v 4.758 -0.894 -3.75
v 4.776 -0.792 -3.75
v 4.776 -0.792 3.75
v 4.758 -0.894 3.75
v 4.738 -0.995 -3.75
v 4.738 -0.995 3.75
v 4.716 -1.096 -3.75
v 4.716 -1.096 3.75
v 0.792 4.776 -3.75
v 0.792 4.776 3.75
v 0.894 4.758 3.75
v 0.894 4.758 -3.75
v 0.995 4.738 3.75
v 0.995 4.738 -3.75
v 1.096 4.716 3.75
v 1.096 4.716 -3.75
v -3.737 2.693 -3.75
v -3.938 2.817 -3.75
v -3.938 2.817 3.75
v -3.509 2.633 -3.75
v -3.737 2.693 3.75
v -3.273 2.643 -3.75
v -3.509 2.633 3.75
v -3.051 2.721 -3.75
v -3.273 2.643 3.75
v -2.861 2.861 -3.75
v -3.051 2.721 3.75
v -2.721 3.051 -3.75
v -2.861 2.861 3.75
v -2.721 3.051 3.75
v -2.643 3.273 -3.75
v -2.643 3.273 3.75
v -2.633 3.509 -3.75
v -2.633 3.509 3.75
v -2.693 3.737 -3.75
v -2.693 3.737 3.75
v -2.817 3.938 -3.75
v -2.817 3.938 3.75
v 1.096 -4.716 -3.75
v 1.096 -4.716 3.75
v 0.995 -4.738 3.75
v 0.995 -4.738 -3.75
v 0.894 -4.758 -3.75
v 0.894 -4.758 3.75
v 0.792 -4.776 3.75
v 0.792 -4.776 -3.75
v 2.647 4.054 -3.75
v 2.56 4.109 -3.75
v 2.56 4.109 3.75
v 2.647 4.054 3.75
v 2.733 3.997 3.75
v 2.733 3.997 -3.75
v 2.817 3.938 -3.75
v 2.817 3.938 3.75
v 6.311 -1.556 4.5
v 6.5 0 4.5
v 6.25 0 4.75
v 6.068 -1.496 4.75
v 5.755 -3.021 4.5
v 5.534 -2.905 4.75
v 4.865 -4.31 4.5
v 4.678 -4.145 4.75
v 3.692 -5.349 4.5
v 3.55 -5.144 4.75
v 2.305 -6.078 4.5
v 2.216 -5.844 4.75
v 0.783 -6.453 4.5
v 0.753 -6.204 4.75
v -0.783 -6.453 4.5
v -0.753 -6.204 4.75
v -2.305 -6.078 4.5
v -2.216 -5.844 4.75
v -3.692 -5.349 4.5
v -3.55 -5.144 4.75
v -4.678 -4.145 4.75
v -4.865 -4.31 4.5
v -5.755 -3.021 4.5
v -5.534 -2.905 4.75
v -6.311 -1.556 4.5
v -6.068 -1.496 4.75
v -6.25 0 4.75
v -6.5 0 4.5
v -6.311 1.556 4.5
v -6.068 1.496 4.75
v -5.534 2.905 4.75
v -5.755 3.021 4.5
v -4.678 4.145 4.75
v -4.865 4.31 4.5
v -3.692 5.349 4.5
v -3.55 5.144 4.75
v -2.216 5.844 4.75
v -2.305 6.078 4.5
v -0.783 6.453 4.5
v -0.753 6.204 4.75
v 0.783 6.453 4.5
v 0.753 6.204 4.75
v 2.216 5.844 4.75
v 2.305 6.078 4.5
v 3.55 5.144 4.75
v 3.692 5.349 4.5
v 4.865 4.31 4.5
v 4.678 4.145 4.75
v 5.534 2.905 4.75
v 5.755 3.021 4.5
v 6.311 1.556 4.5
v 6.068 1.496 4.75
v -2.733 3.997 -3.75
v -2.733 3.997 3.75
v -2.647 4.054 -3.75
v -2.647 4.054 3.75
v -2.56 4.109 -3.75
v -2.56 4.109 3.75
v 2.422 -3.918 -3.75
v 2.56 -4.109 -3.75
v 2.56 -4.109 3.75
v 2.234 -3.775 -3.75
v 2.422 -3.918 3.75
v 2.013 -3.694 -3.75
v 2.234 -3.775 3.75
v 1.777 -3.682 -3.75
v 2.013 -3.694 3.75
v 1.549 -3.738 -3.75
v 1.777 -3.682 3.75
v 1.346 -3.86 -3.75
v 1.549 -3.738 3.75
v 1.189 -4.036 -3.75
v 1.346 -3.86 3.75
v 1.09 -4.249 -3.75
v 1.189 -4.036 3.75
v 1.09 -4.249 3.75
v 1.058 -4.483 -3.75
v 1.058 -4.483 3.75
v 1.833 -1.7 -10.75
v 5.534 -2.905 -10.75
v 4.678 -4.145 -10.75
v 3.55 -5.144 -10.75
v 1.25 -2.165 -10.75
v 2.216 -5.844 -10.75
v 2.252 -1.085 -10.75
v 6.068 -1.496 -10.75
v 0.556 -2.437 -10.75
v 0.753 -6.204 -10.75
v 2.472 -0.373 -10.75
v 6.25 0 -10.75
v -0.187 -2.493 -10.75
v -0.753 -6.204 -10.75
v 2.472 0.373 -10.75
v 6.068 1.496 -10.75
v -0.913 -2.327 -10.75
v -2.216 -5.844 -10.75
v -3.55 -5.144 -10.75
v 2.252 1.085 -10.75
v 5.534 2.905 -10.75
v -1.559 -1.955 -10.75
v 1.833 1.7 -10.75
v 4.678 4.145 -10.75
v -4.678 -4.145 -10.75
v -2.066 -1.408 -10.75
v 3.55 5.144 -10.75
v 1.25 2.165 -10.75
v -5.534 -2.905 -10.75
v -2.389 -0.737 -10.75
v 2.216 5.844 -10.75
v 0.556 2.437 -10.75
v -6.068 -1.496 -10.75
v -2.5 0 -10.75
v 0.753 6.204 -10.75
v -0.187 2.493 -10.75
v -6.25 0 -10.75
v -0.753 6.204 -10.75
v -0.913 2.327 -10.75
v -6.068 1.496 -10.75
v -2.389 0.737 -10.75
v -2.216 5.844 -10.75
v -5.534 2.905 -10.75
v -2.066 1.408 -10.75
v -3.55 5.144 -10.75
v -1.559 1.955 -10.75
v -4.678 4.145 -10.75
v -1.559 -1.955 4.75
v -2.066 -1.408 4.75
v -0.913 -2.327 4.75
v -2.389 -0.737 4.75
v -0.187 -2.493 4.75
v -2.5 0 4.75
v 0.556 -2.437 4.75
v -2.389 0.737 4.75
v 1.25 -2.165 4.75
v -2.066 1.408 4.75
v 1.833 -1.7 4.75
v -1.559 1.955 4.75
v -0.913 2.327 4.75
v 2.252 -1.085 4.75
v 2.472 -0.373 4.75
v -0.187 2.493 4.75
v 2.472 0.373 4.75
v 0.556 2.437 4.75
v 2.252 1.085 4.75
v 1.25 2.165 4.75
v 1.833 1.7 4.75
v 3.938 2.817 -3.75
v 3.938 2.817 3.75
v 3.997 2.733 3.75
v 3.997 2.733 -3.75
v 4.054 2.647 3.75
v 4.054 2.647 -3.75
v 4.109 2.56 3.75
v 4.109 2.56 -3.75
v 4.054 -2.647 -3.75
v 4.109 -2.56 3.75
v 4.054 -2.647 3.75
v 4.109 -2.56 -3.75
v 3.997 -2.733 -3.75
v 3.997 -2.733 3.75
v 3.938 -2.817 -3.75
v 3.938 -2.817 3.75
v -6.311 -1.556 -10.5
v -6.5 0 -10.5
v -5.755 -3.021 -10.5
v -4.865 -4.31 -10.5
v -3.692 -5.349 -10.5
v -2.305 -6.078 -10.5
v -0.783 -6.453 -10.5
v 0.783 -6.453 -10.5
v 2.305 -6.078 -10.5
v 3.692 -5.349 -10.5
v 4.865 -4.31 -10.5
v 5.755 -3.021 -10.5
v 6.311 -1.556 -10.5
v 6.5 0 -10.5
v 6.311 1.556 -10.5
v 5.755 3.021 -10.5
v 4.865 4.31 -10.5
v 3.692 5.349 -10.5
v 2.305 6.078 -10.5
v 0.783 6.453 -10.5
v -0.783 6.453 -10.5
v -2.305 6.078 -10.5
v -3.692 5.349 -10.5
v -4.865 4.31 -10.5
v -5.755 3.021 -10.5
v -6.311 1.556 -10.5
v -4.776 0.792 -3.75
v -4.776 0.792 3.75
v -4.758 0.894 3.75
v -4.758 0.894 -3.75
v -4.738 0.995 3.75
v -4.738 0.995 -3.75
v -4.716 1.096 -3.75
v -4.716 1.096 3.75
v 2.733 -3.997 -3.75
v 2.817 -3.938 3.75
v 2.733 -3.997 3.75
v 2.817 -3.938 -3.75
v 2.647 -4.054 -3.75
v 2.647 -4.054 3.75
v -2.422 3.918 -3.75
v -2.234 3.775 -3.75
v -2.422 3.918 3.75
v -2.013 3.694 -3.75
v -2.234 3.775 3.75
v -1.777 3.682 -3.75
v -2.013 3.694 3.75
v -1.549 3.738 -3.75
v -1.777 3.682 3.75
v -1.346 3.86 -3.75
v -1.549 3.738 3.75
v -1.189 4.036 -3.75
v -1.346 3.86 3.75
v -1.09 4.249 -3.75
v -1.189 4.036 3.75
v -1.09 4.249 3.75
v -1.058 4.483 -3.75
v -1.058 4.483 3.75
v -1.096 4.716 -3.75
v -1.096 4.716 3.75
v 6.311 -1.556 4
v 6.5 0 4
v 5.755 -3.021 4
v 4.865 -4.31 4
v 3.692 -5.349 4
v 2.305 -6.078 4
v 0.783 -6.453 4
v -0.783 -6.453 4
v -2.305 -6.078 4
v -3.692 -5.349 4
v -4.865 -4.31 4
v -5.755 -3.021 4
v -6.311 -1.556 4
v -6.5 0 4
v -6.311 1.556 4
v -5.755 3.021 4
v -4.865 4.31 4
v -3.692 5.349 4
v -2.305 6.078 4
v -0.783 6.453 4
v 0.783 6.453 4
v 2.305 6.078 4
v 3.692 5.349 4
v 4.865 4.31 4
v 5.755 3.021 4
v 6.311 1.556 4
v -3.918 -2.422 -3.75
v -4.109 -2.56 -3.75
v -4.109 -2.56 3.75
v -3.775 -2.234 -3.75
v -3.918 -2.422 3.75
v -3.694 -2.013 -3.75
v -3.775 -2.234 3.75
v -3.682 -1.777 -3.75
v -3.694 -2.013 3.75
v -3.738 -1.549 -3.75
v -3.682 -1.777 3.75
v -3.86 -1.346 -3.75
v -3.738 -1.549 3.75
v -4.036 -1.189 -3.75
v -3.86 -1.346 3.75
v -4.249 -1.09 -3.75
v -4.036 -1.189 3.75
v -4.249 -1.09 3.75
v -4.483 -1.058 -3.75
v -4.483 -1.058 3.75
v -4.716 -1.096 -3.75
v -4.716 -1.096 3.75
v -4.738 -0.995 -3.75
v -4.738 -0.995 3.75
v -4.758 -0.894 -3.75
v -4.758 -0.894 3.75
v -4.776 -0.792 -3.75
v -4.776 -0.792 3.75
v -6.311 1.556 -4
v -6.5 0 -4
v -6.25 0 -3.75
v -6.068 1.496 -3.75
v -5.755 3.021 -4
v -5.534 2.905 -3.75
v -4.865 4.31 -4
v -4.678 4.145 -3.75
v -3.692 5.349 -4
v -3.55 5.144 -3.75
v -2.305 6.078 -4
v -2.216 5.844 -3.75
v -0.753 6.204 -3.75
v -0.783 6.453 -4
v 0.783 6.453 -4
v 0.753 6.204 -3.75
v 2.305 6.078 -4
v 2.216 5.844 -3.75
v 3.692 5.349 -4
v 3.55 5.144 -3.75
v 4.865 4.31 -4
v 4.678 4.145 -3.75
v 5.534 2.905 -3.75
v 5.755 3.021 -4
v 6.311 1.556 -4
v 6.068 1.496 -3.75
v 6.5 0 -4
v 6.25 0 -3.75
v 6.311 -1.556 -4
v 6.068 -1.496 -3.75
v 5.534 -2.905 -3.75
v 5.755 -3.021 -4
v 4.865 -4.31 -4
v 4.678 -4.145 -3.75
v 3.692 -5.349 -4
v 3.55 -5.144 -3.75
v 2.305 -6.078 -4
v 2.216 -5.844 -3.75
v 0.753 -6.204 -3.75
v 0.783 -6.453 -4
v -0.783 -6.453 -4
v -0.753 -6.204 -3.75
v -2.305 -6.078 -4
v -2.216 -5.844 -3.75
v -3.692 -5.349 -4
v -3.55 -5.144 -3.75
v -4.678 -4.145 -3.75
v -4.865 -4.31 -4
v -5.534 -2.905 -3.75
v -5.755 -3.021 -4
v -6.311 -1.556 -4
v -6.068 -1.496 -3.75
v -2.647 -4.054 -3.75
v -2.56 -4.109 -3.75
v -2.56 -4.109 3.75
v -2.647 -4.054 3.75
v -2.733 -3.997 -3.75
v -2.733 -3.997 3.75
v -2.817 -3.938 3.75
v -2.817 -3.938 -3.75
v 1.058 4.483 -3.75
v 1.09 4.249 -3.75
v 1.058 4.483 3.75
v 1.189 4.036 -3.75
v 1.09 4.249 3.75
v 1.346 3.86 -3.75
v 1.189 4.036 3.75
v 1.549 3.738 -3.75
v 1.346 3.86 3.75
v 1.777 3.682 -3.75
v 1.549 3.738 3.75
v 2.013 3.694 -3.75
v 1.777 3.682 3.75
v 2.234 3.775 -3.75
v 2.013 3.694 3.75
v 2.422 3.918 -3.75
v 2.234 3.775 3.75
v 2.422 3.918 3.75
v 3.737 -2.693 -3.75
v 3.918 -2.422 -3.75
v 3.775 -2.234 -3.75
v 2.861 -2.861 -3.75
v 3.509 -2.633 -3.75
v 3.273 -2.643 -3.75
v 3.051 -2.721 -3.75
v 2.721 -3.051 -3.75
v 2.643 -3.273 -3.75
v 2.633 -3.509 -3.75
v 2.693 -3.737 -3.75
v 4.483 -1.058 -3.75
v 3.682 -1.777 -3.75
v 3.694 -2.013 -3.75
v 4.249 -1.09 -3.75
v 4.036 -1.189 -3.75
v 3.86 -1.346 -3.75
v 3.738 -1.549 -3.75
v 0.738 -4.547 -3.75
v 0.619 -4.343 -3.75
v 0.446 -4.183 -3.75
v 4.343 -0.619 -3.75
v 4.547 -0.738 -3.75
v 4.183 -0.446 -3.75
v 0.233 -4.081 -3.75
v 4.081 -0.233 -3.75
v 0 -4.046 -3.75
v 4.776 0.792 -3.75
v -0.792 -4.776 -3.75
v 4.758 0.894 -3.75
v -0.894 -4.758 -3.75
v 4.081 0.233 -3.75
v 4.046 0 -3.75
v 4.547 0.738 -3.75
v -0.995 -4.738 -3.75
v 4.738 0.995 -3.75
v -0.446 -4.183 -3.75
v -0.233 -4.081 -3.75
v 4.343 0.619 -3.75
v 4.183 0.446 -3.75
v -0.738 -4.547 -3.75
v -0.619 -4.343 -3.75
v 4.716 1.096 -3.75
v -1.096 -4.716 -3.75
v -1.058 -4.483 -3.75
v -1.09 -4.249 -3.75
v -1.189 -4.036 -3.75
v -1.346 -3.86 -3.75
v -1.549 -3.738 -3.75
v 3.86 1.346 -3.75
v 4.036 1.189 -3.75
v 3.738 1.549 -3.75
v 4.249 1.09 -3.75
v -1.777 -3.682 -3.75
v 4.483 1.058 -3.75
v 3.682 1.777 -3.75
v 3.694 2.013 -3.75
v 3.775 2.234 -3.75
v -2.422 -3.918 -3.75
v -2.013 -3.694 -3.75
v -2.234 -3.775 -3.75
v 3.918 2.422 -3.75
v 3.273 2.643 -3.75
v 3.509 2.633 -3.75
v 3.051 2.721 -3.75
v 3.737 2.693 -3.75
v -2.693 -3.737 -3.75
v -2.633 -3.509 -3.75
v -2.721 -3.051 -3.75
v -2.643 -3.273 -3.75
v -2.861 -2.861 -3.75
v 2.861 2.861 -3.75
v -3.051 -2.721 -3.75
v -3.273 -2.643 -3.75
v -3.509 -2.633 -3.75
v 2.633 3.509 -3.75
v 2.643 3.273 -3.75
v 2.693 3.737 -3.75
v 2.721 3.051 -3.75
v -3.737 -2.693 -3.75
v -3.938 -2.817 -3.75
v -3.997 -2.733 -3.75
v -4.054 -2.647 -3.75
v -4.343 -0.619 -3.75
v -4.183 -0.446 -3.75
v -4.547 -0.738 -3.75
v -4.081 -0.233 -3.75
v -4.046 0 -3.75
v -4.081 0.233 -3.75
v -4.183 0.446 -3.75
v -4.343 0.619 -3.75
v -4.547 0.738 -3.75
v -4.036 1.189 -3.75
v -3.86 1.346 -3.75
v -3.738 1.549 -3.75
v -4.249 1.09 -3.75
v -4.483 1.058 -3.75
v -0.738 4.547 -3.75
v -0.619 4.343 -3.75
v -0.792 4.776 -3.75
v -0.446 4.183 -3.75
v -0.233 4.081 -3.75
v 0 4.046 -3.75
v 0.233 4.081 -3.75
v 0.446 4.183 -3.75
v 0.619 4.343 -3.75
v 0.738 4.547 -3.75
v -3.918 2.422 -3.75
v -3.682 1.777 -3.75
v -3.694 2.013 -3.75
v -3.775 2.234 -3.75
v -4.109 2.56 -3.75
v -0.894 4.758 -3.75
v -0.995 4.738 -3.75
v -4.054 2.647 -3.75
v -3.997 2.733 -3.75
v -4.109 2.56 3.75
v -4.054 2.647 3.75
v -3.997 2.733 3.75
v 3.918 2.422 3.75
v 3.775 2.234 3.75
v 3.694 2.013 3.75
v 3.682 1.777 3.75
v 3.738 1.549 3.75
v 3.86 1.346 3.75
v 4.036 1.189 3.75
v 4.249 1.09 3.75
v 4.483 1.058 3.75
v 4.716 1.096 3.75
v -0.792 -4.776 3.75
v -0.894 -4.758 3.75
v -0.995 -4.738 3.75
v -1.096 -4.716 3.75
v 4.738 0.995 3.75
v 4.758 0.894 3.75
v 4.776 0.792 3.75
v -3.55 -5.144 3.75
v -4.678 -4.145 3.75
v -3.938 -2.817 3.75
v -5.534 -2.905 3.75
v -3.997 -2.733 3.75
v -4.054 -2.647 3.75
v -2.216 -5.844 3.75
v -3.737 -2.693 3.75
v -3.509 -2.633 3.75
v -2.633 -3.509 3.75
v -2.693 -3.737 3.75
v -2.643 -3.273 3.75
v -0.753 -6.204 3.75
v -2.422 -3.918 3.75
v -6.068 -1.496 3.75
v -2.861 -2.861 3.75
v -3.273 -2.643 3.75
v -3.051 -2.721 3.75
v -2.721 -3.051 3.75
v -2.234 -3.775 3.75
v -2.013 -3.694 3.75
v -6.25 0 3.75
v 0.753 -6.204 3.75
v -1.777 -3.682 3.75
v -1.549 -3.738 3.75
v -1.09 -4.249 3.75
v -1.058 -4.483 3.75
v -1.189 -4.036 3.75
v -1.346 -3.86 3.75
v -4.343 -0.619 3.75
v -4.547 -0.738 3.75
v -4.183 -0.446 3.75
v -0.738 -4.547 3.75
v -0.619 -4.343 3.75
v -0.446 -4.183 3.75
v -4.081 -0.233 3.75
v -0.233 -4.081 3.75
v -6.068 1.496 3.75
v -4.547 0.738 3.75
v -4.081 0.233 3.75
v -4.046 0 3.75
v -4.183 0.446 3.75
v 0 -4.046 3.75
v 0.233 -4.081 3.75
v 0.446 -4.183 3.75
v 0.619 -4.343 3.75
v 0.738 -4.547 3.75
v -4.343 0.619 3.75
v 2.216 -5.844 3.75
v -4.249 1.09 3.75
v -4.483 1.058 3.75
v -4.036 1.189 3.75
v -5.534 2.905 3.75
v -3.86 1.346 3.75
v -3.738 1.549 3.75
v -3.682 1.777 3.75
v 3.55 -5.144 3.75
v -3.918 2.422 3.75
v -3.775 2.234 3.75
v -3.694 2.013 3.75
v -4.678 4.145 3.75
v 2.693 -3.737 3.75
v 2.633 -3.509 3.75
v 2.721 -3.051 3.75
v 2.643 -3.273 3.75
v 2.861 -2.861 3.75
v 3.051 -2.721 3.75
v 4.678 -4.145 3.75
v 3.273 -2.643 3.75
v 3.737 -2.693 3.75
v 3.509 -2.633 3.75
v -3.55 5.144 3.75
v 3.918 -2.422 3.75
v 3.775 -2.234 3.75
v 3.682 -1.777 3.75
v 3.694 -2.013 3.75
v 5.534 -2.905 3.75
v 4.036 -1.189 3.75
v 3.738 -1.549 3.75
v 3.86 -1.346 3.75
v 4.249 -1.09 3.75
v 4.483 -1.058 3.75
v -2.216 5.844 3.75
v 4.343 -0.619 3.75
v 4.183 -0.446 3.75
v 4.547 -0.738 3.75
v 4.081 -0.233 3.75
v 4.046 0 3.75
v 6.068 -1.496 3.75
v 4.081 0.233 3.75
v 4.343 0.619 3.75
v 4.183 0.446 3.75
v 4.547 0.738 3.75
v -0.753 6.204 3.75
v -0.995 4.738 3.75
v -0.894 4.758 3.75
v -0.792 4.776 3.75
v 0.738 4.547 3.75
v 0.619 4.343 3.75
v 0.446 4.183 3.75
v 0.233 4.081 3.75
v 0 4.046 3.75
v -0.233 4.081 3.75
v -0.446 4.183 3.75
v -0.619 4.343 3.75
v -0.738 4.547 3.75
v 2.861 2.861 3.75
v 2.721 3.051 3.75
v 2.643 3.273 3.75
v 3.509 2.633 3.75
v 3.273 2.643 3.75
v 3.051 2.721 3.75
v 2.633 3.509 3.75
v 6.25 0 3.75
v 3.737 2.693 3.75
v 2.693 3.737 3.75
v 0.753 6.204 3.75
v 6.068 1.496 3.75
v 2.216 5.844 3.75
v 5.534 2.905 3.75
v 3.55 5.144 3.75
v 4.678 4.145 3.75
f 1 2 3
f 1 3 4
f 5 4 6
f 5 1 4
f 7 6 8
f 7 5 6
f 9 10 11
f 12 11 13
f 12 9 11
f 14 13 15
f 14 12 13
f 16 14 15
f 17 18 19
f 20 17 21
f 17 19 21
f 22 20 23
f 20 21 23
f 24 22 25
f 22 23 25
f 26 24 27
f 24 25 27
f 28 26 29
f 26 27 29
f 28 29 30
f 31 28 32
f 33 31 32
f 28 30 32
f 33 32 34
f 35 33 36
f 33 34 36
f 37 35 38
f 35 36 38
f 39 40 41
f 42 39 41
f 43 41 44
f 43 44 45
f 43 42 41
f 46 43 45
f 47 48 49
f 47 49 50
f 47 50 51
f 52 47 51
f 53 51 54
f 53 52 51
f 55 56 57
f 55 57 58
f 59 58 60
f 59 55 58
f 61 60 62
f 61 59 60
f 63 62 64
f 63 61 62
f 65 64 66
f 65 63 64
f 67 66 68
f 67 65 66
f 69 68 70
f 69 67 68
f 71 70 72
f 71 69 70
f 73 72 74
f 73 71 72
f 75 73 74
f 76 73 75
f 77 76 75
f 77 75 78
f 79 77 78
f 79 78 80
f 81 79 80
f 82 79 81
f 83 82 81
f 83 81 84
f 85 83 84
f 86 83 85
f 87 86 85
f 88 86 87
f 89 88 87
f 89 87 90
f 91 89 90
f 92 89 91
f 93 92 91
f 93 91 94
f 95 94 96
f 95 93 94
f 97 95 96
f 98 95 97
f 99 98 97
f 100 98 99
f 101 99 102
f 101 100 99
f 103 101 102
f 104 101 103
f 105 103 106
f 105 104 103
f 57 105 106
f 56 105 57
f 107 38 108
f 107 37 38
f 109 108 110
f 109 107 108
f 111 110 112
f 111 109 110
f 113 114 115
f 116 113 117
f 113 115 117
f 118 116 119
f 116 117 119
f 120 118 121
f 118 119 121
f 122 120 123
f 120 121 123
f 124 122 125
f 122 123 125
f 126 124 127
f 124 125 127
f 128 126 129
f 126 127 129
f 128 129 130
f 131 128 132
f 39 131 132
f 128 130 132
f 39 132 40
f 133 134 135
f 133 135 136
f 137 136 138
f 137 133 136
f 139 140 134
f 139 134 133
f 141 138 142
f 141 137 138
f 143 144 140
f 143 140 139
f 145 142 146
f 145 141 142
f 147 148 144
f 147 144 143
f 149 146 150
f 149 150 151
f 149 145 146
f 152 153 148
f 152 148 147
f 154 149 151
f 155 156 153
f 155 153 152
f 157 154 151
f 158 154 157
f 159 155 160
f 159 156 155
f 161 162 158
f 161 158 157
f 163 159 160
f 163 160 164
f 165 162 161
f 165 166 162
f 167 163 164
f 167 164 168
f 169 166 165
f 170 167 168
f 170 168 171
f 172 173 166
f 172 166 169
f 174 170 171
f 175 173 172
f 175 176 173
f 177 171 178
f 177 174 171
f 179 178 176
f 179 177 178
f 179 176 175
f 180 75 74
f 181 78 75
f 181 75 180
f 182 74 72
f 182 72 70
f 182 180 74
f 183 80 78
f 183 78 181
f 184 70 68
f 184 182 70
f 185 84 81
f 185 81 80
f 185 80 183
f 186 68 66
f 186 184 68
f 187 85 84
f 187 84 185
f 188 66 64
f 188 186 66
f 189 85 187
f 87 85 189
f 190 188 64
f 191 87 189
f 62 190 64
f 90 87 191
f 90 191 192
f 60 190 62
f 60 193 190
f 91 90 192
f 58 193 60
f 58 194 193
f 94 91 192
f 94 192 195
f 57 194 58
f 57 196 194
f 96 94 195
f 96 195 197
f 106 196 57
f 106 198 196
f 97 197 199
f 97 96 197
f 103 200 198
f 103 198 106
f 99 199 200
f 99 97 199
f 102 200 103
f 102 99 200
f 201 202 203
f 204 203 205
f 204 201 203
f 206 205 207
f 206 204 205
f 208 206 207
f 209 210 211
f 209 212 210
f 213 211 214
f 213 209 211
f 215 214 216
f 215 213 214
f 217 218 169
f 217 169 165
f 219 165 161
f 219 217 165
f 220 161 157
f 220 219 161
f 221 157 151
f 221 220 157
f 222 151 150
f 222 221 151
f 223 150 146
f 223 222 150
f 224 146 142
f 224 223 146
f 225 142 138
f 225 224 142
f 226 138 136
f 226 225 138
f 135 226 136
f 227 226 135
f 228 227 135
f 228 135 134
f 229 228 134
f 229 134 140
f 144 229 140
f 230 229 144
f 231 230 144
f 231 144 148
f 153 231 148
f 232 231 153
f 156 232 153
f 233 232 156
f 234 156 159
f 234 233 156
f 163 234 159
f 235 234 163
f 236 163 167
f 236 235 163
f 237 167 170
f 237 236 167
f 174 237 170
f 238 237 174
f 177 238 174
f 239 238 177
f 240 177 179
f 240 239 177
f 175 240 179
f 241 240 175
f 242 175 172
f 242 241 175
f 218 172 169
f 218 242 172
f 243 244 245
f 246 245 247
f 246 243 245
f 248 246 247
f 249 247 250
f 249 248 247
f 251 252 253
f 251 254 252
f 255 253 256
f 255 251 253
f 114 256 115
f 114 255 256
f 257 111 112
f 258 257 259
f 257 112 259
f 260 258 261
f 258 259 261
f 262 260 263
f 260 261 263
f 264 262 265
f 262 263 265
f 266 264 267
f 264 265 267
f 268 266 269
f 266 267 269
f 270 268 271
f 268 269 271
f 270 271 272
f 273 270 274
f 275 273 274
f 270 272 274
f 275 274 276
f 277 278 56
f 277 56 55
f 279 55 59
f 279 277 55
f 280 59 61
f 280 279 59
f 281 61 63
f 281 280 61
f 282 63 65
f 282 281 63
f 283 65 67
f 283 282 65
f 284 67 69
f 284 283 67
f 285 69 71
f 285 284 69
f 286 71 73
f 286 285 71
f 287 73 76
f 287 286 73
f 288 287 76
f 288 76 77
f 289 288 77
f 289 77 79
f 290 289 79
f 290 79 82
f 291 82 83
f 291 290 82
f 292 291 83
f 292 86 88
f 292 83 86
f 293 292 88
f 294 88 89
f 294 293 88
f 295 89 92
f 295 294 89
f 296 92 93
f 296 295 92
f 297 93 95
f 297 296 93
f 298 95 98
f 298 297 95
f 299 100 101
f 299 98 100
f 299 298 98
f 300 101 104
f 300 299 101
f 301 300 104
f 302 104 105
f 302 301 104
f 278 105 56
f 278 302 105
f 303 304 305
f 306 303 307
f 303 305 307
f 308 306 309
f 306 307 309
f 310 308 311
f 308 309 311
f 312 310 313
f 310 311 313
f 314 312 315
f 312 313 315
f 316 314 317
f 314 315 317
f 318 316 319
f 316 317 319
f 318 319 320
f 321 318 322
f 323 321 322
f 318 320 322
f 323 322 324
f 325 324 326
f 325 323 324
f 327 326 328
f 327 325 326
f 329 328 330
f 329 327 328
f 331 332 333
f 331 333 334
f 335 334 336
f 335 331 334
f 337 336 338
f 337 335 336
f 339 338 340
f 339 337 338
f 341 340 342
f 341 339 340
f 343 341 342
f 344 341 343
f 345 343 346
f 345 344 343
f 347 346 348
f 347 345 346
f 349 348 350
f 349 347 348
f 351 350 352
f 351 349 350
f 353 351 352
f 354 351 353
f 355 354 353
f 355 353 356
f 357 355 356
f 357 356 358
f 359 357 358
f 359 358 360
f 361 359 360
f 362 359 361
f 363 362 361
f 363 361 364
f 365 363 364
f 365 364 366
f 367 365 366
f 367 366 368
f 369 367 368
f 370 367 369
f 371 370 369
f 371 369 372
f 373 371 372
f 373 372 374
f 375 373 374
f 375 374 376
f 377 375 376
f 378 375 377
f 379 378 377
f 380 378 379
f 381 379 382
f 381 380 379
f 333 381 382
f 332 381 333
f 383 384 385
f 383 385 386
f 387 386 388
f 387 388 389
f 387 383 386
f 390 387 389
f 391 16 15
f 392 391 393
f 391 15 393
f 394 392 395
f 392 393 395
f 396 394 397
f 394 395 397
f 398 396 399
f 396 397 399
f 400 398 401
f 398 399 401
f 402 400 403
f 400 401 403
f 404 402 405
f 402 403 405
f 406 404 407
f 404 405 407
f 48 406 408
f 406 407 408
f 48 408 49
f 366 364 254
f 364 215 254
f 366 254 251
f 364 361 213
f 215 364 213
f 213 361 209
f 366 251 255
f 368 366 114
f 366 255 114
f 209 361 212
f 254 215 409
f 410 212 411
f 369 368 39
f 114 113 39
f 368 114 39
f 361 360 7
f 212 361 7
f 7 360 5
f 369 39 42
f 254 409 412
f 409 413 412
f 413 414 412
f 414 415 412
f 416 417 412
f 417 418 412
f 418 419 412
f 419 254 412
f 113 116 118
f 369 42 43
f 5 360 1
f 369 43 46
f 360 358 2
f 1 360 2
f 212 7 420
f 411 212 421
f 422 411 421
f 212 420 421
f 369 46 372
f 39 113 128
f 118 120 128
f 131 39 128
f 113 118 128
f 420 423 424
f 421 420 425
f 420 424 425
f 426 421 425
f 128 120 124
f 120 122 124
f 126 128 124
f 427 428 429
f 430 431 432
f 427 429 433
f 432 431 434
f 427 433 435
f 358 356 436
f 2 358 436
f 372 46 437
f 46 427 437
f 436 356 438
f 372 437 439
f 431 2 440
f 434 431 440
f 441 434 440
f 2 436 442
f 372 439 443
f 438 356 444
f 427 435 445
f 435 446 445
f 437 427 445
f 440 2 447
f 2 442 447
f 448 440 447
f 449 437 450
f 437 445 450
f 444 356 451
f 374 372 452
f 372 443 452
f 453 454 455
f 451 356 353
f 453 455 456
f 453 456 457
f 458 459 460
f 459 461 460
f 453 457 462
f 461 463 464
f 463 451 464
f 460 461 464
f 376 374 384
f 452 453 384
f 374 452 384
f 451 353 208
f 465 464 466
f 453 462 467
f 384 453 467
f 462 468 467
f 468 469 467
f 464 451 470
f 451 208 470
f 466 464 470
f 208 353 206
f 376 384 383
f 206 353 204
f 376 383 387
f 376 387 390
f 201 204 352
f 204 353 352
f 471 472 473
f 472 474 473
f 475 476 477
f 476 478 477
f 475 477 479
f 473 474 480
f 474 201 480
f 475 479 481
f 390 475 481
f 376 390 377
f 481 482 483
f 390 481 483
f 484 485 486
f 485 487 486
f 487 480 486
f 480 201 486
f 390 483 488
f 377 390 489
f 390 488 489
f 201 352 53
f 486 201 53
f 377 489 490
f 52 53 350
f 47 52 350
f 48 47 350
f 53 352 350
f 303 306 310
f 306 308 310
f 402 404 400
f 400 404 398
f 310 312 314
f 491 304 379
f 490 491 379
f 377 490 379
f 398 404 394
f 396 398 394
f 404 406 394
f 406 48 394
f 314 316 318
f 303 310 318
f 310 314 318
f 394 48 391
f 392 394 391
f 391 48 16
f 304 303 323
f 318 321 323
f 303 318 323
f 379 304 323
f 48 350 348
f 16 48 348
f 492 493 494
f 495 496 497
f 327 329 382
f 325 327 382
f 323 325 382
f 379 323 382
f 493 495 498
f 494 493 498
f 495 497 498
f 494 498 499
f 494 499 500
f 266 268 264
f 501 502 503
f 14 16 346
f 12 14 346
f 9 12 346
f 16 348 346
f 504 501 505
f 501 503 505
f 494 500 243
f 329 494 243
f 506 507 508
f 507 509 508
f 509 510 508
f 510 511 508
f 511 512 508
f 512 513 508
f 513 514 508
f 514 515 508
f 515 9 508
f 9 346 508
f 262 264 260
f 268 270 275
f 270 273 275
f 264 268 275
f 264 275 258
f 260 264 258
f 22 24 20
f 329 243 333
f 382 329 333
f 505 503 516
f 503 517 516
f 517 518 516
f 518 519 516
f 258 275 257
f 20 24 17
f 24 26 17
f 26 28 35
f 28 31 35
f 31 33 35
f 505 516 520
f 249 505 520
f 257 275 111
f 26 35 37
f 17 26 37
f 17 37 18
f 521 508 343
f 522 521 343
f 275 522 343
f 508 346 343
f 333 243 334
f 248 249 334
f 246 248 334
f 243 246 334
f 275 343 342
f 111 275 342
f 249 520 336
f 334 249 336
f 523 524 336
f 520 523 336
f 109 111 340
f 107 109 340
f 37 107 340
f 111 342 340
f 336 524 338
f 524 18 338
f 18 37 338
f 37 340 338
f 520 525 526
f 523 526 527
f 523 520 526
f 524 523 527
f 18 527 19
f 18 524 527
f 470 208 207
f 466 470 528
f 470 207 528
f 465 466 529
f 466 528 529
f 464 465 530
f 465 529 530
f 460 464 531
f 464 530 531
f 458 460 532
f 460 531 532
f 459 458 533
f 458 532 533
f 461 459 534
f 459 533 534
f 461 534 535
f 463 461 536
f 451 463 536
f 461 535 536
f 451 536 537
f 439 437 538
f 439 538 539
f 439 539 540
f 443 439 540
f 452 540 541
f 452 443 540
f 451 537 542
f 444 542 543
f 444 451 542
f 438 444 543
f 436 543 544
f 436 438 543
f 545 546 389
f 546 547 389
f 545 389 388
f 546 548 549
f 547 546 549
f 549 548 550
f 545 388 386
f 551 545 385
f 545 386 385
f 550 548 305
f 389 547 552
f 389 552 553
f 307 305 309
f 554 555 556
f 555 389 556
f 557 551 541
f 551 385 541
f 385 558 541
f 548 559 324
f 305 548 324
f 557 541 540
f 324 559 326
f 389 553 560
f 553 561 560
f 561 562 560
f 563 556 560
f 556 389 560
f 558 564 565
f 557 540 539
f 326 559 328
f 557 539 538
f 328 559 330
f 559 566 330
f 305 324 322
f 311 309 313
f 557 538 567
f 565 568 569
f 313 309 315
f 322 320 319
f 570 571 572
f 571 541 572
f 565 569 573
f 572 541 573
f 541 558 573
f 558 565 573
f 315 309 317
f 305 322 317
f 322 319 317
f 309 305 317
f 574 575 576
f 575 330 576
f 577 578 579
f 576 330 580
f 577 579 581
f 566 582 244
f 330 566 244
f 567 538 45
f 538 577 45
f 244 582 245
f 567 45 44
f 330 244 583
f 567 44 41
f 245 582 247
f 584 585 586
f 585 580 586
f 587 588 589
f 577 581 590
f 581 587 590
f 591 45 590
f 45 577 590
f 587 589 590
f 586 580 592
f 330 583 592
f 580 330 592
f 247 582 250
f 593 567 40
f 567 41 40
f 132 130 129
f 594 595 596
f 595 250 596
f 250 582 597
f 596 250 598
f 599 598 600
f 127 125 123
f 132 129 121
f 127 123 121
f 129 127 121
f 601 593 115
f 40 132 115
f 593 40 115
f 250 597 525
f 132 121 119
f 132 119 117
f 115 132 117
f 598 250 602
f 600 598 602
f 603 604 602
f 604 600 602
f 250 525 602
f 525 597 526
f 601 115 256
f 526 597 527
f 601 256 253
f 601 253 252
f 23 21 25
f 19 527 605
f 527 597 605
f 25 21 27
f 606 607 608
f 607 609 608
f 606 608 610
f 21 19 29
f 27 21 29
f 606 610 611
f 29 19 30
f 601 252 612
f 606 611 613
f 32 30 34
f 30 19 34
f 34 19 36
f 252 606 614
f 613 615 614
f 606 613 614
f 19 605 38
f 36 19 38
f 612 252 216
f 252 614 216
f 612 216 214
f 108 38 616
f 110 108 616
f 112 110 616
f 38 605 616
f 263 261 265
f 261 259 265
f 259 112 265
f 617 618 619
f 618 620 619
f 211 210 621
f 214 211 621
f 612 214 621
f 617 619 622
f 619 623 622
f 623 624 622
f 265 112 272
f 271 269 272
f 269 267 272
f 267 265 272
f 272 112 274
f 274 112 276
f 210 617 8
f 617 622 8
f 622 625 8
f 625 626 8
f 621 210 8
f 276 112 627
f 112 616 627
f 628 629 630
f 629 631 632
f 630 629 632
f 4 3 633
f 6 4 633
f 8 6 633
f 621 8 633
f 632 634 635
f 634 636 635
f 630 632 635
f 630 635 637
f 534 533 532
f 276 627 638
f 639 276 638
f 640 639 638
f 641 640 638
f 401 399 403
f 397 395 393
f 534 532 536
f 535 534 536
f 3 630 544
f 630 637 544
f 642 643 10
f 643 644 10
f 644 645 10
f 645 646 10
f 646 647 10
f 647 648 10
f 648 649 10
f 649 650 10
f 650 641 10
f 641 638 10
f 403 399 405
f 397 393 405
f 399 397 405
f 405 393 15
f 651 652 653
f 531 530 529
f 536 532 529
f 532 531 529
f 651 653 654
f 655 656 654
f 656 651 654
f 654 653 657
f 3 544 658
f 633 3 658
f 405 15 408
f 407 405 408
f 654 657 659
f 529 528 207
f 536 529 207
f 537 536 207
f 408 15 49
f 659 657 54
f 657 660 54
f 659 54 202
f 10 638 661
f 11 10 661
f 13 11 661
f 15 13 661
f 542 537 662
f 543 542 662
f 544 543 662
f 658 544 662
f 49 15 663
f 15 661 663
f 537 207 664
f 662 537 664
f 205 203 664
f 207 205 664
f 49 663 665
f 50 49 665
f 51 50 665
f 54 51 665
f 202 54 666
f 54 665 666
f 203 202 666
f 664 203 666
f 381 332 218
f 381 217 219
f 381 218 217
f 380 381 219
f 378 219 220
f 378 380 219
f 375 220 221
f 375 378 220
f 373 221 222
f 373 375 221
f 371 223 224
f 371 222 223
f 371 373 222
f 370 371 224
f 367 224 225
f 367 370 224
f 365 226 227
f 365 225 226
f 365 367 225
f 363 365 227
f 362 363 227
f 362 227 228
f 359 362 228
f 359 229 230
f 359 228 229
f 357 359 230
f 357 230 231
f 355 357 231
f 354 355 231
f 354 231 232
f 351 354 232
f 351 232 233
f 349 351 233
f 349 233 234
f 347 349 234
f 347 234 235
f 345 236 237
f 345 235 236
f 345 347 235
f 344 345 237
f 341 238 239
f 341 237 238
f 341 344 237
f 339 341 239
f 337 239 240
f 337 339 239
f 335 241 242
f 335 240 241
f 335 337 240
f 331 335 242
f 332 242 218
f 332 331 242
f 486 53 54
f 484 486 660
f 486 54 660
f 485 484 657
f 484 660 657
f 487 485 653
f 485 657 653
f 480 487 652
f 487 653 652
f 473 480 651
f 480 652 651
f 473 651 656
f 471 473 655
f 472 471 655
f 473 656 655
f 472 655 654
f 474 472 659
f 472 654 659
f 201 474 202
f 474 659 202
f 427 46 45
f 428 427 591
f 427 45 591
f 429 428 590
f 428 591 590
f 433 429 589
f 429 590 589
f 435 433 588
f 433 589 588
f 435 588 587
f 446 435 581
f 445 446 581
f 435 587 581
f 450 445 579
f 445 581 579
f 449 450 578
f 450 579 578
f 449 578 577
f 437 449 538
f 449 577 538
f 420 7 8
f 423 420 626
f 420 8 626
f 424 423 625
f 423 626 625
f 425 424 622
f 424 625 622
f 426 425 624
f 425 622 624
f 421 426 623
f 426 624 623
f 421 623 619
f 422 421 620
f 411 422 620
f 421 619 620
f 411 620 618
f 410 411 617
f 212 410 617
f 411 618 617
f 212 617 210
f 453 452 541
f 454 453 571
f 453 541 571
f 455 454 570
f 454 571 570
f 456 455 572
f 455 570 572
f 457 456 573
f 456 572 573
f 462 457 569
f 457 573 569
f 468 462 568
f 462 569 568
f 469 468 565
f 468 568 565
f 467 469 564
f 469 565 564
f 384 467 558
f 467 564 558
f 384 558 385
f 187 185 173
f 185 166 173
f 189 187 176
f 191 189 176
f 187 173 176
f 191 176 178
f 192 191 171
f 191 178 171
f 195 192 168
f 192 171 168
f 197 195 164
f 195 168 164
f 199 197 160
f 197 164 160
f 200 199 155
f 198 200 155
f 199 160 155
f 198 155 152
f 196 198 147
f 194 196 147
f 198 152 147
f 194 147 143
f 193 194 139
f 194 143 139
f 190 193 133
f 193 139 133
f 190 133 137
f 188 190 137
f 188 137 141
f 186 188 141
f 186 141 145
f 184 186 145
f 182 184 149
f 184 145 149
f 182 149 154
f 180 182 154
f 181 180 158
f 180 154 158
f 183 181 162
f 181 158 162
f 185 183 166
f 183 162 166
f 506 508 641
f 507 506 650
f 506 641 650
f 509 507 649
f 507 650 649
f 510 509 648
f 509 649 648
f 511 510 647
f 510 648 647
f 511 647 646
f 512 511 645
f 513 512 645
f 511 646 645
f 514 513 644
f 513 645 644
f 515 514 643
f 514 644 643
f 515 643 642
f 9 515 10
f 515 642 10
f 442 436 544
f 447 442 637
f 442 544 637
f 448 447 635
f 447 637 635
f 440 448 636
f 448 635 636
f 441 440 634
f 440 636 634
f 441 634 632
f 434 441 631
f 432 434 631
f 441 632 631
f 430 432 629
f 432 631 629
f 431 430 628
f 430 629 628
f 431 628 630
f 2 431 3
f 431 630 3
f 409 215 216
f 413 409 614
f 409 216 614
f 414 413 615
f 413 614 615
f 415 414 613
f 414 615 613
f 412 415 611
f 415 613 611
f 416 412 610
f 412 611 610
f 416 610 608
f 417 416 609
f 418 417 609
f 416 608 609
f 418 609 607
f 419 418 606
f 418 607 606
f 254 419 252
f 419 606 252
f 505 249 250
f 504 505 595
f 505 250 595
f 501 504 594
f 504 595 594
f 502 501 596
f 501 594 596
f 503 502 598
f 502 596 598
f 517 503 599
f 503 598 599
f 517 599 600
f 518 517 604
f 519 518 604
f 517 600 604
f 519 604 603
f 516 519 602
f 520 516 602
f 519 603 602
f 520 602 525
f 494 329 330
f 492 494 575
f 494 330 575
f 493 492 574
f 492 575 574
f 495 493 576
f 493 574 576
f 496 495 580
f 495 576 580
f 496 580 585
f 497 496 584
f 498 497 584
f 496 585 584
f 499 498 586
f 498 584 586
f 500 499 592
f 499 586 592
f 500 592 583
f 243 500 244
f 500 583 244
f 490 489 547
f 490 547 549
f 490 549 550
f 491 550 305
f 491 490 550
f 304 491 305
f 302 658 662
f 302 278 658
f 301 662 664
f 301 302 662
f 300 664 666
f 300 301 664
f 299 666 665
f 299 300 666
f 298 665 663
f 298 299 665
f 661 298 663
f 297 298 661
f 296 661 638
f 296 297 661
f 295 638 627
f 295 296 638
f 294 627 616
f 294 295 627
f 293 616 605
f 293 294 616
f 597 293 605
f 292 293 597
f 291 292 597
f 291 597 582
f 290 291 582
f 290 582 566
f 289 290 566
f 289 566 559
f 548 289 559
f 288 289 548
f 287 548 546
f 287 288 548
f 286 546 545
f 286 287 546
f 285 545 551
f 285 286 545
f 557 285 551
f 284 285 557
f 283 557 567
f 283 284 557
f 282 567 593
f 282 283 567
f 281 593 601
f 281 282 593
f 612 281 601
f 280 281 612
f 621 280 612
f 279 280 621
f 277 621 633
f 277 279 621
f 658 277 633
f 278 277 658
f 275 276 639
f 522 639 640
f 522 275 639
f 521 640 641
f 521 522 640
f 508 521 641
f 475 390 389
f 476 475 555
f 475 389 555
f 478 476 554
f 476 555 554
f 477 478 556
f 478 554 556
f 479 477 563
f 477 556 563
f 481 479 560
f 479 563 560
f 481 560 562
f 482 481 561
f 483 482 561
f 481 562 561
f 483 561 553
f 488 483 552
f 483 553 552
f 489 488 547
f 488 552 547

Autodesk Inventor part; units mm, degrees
ref_plane "YZ Plane" through (0, 0, 0) normal (1, 0, 0) x (0, 1, 0)
ref_plane "XZ Plane" through (0, 0, 0) normal (0, 1, 0) x (-1, 0, 0)
ref_plane "XY Plane" through (0, 0, 0) normal (0, 0, 1) x (1, 0, 0)
sketch "Sketch1" plane through (0, 0, 0) normal (0, 0, 1) x (1, 0, 0)
  circle A0 centre (0, 0) radius 4.8415
  dimension "d0" = 9.6831
extrude "Extrusion1" add sketch "Sketch1" along normal mid plane 7.5
sketch "Sketch2" plane through (0, 0, 3.75) normal (0, 0, 1) x (1, 0, 0)
  circle A0 centre (0, 0) radius 4.8415 projected
  circle A1 centre (0, 4.8415) radius 0.795
  dimension "d4" = 1.59
extrude "Extrusion2" cut sketch "Sketch2" against normal through all contours A1 A0 | A0 A1 picked at (0, 4.5717) picked at (0.0219, 5.1007)
pattern_circular "Circular Pattern1" count 16 over 360 about axis through (0, 0, 0) along (0, 0, 1) of "Extrusion2"
sketch "Sketch3" plane through (0, 0, 3.75) normal (0, 0, 1) x (1, 0, 0)
  arc A0 (2.8171, 3.9376) -> (2.5598, 4.1095) centre (0, 0) ccw projected
  circle A1 centre (0, 0) radius 6.5
  dimension "d11" = 13
extrude "Extrusion3" add sketch "Sketch3" along normal blind 1
sketch "Sketch4" plane through (0, 0, -3.75) normal (0, 0, -1) x (-1, 0, 0)
  circle A0 centre (0, 0) radius 6.5 projected
extrude "Extrusion4" add sketch "Sketch4" along normal blind 7
sketch "Sketch5" plane through (0, 0, -10.75) normal (0, 0, -1) x (-1, 0, 0)
  circle A0 centre (0, 0) radius 6.5 projected
  circle A1 centre (0, 0) radius 2.5
  dimension "d17" = 5
extrude "Extrusion5" cut sketch "Sketch5" against normal through all contours A1
chamfer "Chamfer1" distance 0.25 angle 45 4 edges at (6.5, 0, -10.75) (6.5, 0, -3.75) (-6.5, 0, 3.75) (-6.5, 0, 4.75)
properties part number "drive pulley"
